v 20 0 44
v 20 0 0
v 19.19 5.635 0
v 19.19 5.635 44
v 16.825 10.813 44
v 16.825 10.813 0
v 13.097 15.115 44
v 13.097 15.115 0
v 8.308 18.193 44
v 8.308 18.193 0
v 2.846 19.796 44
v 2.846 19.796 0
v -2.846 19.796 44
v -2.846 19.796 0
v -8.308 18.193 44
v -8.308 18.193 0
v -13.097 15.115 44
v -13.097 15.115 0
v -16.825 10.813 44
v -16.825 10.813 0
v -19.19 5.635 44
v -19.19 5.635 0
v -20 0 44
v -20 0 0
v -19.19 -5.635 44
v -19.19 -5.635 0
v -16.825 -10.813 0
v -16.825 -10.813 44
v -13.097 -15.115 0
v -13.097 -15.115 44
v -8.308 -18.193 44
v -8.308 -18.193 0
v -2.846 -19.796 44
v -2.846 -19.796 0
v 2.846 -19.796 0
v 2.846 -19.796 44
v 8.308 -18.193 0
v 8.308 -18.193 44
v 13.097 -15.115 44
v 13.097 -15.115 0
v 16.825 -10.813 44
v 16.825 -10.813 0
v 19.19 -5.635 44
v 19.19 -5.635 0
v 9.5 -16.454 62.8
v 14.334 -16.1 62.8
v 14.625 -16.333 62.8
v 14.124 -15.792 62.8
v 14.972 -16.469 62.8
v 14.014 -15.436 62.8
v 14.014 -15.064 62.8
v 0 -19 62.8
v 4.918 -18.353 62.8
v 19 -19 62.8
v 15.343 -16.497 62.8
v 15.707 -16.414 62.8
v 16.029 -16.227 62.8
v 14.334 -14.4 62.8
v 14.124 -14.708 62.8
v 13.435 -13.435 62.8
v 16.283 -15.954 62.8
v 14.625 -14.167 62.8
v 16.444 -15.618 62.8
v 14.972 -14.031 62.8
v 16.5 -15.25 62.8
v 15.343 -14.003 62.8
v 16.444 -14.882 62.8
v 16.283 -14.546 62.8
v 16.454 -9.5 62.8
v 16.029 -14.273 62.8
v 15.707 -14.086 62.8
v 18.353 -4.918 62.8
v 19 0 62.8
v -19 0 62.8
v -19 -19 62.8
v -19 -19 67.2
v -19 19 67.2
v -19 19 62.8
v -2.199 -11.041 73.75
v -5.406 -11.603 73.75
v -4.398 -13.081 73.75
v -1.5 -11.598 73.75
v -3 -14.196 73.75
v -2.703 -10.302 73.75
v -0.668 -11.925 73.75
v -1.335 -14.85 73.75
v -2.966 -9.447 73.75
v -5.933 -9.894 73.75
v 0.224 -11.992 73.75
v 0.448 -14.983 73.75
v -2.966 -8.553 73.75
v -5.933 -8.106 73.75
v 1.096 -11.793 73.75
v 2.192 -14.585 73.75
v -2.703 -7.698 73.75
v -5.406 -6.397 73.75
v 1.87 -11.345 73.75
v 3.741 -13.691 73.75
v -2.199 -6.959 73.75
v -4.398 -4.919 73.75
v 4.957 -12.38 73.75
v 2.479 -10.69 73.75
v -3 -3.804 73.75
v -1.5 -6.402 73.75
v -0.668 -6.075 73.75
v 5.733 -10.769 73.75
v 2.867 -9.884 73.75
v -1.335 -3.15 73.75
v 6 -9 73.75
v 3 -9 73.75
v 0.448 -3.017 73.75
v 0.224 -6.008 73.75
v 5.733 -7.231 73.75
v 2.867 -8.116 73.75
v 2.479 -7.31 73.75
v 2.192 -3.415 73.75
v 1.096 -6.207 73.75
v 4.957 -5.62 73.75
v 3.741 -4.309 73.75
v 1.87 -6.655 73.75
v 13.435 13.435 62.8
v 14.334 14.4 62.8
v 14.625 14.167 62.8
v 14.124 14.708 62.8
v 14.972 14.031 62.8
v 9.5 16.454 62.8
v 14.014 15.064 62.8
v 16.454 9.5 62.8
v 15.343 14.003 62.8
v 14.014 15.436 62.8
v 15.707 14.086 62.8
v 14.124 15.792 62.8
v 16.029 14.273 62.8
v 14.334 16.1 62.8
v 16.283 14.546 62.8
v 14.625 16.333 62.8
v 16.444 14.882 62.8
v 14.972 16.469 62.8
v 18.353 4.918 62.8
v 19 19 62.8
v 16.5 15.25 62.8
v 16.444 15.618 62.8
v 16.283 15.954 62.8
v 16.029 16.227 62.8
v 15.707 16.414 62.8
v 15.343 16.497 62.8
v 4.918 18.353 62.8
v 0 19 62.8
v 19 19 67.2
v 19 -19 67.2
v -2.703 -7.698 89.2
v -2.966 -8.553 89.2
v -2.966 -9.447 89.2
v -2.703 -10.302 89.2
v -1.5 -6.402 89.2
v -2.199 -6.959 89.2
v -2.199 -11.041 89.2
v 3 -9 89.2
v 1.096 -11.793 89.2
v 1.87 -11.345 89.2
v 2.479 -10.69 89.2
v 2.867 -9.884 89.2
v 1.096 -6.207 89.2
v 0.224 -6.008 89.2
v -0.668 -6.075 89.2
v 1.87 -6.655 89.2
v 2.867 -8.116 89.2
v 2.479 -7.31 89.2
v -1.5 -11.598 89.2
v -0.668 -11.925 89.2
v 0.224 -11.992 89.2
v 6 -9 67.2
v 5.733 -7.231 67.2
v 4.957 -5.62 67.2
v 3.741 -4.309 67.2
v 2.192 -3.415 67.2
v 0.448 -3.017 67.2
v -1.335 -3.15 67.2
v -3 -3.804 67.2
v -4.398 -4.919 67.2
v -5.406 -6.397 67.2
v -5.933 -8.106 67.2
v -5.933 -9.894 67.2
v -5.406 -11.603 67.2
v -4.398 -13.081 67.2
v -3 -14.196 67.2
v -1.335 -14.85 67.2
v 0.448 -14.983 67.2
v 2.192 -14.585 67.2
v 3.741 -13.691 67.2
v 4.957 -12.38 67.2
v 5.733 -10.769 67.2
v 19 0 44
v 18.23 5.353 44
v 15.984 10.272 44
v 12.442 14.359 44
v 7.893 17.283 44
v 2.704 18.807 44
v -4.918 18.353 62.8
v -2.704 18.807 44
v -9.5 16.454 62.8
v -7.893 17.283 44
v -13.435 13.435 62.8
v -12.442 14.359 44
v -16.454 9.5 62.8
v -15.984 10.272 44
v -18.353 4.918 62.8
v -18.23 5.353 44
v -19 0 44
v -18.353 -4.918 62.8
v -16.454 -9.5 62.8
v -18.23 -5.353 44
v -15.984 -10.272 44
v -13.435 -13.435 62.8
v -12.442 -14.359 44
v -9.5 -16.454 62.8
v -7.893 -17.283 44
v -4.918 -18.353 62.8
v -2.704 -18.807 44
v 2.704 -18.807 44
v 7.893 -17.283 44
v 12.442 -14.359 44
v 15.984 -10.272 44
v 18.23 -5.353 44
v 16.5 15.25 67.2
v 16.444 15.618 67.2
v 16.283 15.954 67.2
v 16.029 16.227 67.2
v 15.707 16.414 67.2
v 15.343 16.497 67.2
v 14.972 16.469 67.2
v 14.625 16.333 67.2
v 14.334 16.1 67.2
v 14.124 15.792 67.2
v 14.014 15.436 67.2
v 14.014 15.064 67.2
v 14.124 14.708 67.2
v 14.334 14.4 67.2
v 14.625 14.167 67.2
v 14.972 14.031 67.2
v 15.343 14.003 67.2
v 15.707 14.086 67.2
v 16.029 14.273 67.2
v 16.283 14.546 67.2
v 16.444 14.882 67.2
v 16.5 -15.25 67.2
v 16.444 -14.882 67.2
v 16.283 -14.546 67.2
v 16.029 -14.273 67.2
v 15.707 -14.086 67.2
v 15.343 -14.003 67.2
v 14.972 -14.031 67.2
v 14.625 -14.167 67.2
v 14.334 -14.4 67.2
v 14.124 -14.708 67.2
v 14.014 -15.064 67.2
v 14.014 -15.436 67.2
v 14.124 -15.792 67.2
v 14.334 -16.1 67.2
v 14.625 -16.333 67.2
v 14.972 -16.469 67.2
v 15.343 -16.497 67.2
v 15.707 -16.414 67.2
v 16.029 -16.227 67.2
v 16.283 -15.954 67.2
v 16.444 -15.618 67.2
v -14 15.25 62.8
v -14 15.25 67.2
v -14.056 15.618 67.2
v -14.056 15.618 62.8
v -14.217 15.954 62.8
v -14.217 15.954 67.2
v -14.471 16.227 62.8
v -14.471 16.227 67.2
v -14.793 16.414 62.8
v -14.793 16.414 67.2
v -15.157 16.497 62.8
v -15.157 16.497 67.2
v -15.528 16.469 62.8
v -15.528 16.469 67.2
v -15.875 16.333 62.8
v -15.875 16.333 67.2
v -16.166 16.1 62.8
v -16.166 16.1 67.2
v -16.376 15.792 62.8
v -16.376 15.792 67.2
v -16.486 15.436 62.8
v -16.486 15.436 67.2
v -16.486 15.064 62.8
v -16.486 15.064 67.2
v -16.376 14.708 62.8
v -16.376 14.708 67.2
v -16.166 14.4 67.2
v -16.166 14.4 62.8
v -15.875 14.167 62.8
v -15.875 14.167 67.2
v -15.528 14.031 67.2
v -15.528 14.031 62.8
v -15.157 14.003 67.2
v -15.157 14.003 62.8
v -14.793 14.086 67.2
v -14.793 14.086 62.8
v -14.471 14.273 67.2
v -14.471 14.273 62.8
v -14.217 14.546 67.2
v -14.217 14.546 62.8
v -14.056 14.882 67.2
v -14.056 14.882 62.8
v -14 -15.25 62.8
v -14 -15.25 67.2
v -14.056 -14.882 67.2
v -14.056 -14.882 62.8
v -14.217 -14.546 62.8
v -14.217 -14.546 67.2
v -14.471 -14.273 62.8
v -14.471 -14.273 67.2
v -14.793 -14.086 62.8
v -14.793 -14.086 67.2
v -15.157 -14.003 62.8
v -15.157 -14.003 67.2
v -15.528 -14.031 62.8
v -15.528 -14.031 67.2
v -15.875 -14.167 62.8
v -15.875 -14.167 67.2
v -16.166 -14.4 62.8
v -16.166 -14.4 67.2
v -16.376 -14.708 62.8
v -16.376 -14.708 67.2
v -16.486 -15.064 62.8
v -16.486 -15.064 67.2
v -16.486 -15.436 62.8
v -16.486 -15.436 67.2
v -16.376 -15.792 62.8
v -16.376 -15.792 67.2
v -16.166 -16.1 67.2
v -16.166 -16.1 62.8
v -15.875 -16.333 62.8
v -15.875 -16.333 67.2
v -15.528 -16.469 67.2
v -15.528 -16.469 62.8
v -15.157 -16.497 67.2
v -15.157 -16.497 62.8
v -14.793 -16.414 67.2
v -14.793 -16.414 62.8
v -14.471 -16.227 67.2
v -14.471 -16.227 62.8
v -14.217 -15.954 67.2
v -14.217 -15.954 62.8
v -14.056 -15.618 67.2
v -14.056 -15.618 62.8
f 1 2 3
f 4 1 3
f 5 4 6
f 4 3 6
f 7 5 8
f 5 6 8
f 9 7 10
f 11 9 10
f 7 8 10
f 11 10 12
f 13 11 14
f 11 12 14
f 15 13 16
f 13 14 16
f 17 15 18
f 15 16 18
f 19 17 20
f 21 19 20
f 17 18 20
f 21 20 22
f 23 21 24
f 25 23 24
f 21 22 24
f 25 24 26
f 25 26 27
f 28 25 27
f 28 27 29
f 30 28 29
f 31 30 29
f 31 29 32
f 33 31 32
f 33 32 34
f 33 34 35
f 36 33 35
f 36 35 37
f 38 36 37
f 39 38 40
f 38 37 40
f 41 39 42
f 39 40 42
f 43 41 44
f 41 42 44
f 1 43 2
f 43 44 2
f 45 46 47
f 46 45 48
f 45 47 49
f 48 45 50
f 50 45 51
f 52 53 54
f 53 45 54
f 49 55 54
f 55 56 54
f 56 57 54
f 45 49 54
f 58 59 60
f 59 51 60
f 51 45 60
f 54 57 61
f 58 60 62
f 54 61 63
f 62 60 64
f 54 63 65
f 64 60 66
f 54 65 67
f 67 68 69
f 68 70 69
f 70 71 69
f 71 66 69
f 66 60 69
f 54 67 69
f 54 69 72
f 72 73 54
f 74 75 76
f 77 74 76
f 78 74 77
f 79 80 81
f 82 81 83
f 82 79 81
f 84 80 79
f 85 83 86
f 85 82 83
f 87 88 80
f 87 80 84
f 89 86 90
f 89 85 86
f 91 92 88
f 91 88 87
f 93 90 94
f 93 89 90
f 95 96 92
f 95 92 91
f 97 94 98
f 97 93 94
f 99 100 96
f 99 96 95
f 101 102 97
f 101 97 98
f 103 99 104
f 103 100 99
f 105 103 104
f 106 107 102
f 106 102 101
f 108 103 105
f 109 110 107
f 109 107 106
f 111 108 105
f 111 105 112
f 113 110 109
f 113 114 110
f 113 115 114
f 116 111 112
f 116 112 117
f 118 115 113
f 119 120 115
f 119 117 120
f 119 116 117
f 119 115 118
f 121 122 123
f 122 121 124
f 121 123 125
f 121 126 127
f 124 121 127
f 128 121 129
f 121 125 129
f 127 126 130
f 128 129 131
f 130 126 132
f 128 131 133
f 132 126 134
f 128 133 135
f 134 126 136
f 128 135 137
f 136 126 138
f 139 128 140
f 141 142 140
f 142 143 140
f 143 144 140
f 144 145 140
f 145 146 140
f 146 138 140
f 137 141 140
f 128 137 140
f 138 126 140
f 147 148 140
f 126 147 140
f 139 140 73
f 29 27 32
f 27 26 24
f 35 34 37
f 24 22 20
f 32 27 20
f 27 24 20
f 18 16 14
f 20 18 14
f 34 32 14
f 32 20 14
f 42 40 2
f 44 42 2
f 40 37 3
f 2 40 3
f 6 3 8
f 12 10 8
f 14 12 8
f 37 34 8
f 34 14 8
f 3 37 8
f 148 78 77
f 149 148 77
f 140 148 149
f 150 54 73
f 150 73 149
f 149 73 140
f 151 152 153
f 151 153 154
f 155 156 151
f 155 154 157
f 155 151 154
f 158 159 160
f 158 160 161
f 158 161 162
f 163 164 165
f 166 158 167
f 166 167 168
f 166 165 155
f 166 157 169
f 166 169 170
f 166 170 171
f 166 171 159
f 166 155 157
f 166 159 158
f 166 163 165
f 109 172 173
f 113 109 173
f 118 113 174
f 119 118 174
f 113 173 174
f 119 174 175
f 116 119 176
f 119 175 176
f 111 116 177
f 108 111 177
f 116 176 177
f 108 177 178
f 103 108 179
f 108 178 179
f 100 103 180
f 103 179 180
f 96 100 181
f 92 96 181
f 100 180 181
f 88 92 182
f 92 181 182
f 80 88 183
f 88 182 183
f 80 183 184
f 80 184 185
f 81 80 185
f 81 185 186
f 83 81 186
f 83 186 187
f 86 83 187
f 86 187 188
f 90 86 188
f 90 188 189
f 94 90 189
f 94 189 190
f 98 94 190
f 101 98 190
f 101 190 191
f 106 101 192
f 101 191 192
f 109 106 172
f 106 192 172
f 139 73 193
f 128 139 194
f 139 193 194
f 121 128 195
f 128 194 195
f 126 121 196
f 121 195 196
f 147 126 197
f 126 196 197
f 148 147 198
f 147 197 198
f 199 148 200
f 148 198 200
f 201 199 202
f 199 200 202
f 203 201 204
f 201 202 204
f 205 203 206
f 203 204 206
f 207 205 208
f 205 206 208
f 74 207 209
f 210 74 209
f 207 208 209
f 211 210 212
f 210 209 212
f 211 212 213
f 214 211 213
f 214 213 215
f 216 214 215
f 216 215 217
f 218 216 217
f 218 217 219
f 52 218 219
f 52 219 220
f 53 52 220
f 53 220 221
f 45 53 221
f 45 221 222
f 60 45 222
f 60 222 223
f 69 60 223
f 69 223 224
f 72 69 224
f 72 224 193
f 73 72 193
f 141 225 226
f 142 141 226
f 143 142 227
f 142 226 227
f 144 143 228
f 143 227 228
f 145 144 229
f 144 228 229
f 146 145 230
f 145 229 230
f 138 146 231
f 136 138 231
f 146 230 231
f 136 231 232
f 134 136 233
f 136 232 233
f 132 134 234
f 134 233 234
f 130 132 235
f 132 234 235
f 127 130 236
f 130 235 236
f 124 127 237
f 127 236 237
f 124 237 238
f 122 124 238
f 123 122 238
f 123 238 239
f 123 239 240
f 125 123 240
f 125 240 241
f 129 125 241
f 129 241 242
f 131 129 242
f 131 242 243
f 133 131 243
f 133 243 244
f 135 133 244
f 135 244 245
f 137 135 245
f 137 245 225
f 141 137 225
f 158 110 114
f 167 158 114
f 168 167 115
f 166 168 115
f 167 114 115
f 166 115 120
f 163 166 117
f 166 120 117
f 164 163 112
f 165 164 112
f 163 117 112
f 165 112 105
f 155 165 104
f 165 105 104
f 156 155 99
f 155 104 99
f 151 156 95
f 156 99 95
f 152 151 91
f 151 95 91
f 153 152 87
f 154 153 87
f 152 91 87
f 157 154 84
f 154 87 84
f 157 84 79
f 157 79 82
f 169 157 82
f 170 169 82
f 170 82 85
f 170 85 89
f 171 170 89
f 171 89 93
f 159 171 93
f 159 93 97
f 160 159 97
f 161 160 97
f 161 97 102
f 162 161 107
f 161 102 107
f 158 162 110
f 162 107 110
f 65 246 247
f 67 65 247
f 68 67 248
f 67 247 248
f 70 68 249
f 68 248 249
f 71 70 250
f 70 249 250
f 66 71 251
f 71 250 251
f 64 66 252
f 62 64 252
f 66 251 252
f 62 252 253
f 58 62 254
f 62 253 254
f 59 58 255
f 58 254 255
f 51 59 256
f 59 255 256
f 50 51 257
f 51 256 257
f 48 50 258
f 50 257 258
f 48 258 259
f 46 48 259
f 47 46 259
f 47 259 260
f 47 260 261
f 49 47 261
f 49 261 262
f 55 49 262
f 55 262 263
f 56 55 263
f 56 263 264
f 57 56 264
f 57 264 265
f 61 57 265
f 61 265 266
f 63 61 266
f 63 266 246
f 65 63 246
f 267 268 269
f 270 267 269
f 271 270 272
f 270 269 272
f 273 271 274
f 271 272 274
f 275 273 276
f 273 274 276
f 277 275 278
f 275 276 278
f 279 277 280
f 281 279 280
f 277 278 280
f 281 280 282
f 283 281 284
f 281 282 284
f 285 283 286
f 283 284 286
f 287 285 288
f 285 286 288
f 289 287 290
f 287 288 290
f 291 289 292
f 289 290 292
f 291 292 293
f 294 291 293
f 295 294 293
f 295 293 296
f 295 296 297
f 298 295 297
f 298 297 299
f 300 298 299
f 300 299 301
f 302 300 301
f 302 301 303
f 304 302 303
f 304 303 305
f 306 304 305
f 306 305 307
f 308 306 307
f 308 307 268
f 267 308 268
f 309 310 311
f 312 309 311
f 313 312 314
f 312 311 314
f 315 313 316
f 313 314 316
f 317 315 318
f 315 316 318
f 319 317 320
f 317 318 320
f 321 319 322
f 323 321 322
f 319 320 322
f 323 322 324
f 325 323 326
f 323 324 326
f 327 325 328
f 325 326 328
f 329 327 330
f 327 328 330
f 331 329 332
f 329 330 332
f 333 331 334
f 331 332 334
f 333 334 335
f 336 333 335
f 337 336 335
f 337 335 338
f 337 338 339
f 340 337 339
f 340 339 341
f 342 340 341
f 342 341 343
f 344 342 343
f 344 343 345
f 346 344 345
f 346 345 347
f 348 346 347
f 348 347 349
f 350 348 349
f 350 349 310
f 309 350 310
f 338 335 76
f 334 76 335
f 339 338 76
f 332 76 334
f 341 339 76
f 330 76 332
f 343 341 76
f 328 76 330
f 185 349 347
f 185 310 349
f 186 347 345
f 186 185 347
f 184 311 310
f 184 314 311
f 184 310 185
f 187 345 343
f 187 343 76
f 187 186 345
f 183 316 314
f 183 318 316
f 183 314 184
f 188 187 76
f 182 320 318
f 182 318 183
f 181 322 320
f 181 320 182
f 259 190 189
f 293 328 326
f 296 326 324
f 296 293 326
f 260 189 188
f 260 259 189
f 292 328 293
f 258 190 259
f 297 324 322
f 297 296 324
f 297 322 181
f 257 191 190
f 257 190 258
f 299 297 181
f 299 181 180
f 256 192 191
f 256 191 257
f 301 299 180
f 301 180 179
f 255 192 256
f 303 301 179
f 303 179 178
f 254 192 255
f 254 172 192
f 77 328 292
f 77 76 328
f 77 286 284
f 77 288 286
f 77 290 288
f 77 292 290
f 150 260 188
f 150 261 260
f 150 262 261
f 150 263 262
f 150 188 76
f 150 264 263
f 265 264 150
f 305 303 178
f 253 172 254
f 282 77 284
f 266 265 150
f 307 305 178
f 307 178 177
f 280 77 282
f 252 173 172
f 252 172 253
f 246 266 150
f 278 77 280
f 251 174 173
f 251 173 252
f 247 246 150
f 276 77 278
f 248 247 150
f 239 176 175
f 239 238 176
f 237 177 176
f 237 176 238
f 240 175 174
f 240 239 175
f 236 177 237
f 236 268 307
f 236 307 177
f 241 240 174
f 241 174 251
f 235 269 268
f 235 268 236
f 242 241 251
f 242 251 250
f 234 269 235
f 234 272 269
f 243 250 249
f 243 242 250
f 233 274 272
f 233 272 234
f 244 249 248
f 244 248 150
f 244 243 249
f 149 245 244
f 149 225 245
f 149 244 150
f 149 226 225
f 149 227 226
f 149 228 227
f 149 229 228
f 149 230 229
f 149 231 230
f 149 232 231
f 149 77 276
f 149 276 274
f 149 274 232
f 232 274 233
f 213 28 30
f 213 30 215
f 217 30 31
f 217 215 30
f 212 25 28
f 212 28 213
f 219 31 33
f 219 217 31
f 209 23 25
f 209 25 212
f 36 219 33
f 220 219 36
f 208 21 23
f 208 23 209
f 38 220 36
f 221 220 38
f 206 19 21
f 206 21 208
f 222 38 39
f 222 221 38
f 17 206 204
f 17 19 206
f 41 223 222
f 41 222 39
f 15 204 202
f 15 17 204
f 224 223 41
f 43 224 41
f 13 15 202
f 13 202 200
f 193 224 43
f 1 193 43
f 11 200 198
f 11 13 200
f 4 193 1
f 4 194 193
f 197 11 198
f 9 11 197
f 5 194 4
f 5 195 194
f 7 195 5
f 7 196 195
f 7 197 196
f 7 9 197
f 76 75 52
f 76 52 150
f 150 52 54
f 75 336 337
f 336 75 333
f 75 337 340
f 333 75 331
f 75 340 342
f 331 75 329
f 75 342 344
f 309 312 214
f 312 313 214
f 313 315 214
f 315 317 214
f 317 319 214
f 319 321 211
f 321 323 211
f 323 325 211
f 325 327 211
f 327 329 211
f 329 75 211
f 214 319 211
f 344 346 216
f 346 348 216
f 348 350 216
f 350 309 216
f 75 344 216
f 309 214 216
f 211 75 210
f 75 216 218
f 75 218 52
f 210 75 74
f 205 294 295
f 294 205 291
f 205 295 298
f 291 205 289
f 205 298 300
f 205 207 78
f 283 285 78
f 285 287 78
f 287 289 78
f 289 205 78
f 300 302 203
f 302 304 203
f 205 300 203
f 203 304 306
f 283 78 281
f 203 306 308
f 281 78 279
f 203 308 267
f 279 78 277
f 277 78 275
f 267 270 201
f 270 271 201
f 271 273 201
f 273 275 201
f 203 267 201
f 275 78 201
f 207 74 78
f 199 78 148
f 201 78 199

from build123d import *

# Parameters (mm, degrees)
ESQUISSE1_R      = 20
EXTRUSION1_DEPTH = 44
ESQUISSE2_R      = 19
EXTRUSION2_DEPTH = 18.8
ESQUISSE3_W      = 38
ESQUISSE3_H      = 38
EXTRUSION3_DEPTH = 4.4
ESQUISSE4_R      = 1.25
EXTRUSION4_DEPTH = 73.909807296
ESQUISSE5_R      = 6
EXTRUSION5_DEPTH = 6.55
ESQUISSE6_R      = 3
EXTRUSION6_DEPTH = 15.45


with BuildPart() as part:
    # Esquisse1 → Extrusion1 (new body)
    with BuildSketch(Plane.XY):
        Circle(ESQUISSE1_R)
    extrude(amount=EXTRUSION1_DEPTH)

    # Esquisse2 → Extrusion2 (add)
    with BuildSketch(Plane.XY.offset(44)):
        Circle(ESQUISSE2_R)
    extrude(amount=EXTRUSION2_DEPTH)

    # Esquisse3 → Extrusion3 (add)
    with BuildSketch(Plane.XY.offset(62.8)):
        Rectangle(ESQUISSE3_W, ESQUISSE3_H)
    extrude(amount=EXTRUSION3_DEPTH)

    # Esquisse4 → Extrusion4 (cut, through all)
    with BuildSketch(Plane.XY.offset(67.2)):
        with Locations((-15.25, 15.25)):
            Circle(ESQUISSE4_R)
        with Locations((15.25, 15.25)):
            Circle(ESQUISSE4_R)
        with Locations((15.25, -15.25)):
            Circle(ESQUISSE4_R)
        with Locations((-15.25, -15.25)):
            Circle(ESQUISSE4_R)
    extrude(amount=-EXTRUSION4_DEPTH, mode=Mode.SUBTRACT)

    # Esquisse5 → Extrusion5 (add)
    with BuildSketch(Plane.XY.offset(67.2)):
        with Locations((0, -9)):
            Circle(ESQUISSE5_R)
    extrude(amount=EXTRUSION5_DEPTH)

    # Esquisse6 → Extrusion6 (add)
    with BuildSketch(Plane.XY.offset(73.75)):
        with Locations((0, -9)):
            Circle(ESQUISSE6_R)
    extrude(amount=EXTRUSION6_DEPTH)


solid = part.part
